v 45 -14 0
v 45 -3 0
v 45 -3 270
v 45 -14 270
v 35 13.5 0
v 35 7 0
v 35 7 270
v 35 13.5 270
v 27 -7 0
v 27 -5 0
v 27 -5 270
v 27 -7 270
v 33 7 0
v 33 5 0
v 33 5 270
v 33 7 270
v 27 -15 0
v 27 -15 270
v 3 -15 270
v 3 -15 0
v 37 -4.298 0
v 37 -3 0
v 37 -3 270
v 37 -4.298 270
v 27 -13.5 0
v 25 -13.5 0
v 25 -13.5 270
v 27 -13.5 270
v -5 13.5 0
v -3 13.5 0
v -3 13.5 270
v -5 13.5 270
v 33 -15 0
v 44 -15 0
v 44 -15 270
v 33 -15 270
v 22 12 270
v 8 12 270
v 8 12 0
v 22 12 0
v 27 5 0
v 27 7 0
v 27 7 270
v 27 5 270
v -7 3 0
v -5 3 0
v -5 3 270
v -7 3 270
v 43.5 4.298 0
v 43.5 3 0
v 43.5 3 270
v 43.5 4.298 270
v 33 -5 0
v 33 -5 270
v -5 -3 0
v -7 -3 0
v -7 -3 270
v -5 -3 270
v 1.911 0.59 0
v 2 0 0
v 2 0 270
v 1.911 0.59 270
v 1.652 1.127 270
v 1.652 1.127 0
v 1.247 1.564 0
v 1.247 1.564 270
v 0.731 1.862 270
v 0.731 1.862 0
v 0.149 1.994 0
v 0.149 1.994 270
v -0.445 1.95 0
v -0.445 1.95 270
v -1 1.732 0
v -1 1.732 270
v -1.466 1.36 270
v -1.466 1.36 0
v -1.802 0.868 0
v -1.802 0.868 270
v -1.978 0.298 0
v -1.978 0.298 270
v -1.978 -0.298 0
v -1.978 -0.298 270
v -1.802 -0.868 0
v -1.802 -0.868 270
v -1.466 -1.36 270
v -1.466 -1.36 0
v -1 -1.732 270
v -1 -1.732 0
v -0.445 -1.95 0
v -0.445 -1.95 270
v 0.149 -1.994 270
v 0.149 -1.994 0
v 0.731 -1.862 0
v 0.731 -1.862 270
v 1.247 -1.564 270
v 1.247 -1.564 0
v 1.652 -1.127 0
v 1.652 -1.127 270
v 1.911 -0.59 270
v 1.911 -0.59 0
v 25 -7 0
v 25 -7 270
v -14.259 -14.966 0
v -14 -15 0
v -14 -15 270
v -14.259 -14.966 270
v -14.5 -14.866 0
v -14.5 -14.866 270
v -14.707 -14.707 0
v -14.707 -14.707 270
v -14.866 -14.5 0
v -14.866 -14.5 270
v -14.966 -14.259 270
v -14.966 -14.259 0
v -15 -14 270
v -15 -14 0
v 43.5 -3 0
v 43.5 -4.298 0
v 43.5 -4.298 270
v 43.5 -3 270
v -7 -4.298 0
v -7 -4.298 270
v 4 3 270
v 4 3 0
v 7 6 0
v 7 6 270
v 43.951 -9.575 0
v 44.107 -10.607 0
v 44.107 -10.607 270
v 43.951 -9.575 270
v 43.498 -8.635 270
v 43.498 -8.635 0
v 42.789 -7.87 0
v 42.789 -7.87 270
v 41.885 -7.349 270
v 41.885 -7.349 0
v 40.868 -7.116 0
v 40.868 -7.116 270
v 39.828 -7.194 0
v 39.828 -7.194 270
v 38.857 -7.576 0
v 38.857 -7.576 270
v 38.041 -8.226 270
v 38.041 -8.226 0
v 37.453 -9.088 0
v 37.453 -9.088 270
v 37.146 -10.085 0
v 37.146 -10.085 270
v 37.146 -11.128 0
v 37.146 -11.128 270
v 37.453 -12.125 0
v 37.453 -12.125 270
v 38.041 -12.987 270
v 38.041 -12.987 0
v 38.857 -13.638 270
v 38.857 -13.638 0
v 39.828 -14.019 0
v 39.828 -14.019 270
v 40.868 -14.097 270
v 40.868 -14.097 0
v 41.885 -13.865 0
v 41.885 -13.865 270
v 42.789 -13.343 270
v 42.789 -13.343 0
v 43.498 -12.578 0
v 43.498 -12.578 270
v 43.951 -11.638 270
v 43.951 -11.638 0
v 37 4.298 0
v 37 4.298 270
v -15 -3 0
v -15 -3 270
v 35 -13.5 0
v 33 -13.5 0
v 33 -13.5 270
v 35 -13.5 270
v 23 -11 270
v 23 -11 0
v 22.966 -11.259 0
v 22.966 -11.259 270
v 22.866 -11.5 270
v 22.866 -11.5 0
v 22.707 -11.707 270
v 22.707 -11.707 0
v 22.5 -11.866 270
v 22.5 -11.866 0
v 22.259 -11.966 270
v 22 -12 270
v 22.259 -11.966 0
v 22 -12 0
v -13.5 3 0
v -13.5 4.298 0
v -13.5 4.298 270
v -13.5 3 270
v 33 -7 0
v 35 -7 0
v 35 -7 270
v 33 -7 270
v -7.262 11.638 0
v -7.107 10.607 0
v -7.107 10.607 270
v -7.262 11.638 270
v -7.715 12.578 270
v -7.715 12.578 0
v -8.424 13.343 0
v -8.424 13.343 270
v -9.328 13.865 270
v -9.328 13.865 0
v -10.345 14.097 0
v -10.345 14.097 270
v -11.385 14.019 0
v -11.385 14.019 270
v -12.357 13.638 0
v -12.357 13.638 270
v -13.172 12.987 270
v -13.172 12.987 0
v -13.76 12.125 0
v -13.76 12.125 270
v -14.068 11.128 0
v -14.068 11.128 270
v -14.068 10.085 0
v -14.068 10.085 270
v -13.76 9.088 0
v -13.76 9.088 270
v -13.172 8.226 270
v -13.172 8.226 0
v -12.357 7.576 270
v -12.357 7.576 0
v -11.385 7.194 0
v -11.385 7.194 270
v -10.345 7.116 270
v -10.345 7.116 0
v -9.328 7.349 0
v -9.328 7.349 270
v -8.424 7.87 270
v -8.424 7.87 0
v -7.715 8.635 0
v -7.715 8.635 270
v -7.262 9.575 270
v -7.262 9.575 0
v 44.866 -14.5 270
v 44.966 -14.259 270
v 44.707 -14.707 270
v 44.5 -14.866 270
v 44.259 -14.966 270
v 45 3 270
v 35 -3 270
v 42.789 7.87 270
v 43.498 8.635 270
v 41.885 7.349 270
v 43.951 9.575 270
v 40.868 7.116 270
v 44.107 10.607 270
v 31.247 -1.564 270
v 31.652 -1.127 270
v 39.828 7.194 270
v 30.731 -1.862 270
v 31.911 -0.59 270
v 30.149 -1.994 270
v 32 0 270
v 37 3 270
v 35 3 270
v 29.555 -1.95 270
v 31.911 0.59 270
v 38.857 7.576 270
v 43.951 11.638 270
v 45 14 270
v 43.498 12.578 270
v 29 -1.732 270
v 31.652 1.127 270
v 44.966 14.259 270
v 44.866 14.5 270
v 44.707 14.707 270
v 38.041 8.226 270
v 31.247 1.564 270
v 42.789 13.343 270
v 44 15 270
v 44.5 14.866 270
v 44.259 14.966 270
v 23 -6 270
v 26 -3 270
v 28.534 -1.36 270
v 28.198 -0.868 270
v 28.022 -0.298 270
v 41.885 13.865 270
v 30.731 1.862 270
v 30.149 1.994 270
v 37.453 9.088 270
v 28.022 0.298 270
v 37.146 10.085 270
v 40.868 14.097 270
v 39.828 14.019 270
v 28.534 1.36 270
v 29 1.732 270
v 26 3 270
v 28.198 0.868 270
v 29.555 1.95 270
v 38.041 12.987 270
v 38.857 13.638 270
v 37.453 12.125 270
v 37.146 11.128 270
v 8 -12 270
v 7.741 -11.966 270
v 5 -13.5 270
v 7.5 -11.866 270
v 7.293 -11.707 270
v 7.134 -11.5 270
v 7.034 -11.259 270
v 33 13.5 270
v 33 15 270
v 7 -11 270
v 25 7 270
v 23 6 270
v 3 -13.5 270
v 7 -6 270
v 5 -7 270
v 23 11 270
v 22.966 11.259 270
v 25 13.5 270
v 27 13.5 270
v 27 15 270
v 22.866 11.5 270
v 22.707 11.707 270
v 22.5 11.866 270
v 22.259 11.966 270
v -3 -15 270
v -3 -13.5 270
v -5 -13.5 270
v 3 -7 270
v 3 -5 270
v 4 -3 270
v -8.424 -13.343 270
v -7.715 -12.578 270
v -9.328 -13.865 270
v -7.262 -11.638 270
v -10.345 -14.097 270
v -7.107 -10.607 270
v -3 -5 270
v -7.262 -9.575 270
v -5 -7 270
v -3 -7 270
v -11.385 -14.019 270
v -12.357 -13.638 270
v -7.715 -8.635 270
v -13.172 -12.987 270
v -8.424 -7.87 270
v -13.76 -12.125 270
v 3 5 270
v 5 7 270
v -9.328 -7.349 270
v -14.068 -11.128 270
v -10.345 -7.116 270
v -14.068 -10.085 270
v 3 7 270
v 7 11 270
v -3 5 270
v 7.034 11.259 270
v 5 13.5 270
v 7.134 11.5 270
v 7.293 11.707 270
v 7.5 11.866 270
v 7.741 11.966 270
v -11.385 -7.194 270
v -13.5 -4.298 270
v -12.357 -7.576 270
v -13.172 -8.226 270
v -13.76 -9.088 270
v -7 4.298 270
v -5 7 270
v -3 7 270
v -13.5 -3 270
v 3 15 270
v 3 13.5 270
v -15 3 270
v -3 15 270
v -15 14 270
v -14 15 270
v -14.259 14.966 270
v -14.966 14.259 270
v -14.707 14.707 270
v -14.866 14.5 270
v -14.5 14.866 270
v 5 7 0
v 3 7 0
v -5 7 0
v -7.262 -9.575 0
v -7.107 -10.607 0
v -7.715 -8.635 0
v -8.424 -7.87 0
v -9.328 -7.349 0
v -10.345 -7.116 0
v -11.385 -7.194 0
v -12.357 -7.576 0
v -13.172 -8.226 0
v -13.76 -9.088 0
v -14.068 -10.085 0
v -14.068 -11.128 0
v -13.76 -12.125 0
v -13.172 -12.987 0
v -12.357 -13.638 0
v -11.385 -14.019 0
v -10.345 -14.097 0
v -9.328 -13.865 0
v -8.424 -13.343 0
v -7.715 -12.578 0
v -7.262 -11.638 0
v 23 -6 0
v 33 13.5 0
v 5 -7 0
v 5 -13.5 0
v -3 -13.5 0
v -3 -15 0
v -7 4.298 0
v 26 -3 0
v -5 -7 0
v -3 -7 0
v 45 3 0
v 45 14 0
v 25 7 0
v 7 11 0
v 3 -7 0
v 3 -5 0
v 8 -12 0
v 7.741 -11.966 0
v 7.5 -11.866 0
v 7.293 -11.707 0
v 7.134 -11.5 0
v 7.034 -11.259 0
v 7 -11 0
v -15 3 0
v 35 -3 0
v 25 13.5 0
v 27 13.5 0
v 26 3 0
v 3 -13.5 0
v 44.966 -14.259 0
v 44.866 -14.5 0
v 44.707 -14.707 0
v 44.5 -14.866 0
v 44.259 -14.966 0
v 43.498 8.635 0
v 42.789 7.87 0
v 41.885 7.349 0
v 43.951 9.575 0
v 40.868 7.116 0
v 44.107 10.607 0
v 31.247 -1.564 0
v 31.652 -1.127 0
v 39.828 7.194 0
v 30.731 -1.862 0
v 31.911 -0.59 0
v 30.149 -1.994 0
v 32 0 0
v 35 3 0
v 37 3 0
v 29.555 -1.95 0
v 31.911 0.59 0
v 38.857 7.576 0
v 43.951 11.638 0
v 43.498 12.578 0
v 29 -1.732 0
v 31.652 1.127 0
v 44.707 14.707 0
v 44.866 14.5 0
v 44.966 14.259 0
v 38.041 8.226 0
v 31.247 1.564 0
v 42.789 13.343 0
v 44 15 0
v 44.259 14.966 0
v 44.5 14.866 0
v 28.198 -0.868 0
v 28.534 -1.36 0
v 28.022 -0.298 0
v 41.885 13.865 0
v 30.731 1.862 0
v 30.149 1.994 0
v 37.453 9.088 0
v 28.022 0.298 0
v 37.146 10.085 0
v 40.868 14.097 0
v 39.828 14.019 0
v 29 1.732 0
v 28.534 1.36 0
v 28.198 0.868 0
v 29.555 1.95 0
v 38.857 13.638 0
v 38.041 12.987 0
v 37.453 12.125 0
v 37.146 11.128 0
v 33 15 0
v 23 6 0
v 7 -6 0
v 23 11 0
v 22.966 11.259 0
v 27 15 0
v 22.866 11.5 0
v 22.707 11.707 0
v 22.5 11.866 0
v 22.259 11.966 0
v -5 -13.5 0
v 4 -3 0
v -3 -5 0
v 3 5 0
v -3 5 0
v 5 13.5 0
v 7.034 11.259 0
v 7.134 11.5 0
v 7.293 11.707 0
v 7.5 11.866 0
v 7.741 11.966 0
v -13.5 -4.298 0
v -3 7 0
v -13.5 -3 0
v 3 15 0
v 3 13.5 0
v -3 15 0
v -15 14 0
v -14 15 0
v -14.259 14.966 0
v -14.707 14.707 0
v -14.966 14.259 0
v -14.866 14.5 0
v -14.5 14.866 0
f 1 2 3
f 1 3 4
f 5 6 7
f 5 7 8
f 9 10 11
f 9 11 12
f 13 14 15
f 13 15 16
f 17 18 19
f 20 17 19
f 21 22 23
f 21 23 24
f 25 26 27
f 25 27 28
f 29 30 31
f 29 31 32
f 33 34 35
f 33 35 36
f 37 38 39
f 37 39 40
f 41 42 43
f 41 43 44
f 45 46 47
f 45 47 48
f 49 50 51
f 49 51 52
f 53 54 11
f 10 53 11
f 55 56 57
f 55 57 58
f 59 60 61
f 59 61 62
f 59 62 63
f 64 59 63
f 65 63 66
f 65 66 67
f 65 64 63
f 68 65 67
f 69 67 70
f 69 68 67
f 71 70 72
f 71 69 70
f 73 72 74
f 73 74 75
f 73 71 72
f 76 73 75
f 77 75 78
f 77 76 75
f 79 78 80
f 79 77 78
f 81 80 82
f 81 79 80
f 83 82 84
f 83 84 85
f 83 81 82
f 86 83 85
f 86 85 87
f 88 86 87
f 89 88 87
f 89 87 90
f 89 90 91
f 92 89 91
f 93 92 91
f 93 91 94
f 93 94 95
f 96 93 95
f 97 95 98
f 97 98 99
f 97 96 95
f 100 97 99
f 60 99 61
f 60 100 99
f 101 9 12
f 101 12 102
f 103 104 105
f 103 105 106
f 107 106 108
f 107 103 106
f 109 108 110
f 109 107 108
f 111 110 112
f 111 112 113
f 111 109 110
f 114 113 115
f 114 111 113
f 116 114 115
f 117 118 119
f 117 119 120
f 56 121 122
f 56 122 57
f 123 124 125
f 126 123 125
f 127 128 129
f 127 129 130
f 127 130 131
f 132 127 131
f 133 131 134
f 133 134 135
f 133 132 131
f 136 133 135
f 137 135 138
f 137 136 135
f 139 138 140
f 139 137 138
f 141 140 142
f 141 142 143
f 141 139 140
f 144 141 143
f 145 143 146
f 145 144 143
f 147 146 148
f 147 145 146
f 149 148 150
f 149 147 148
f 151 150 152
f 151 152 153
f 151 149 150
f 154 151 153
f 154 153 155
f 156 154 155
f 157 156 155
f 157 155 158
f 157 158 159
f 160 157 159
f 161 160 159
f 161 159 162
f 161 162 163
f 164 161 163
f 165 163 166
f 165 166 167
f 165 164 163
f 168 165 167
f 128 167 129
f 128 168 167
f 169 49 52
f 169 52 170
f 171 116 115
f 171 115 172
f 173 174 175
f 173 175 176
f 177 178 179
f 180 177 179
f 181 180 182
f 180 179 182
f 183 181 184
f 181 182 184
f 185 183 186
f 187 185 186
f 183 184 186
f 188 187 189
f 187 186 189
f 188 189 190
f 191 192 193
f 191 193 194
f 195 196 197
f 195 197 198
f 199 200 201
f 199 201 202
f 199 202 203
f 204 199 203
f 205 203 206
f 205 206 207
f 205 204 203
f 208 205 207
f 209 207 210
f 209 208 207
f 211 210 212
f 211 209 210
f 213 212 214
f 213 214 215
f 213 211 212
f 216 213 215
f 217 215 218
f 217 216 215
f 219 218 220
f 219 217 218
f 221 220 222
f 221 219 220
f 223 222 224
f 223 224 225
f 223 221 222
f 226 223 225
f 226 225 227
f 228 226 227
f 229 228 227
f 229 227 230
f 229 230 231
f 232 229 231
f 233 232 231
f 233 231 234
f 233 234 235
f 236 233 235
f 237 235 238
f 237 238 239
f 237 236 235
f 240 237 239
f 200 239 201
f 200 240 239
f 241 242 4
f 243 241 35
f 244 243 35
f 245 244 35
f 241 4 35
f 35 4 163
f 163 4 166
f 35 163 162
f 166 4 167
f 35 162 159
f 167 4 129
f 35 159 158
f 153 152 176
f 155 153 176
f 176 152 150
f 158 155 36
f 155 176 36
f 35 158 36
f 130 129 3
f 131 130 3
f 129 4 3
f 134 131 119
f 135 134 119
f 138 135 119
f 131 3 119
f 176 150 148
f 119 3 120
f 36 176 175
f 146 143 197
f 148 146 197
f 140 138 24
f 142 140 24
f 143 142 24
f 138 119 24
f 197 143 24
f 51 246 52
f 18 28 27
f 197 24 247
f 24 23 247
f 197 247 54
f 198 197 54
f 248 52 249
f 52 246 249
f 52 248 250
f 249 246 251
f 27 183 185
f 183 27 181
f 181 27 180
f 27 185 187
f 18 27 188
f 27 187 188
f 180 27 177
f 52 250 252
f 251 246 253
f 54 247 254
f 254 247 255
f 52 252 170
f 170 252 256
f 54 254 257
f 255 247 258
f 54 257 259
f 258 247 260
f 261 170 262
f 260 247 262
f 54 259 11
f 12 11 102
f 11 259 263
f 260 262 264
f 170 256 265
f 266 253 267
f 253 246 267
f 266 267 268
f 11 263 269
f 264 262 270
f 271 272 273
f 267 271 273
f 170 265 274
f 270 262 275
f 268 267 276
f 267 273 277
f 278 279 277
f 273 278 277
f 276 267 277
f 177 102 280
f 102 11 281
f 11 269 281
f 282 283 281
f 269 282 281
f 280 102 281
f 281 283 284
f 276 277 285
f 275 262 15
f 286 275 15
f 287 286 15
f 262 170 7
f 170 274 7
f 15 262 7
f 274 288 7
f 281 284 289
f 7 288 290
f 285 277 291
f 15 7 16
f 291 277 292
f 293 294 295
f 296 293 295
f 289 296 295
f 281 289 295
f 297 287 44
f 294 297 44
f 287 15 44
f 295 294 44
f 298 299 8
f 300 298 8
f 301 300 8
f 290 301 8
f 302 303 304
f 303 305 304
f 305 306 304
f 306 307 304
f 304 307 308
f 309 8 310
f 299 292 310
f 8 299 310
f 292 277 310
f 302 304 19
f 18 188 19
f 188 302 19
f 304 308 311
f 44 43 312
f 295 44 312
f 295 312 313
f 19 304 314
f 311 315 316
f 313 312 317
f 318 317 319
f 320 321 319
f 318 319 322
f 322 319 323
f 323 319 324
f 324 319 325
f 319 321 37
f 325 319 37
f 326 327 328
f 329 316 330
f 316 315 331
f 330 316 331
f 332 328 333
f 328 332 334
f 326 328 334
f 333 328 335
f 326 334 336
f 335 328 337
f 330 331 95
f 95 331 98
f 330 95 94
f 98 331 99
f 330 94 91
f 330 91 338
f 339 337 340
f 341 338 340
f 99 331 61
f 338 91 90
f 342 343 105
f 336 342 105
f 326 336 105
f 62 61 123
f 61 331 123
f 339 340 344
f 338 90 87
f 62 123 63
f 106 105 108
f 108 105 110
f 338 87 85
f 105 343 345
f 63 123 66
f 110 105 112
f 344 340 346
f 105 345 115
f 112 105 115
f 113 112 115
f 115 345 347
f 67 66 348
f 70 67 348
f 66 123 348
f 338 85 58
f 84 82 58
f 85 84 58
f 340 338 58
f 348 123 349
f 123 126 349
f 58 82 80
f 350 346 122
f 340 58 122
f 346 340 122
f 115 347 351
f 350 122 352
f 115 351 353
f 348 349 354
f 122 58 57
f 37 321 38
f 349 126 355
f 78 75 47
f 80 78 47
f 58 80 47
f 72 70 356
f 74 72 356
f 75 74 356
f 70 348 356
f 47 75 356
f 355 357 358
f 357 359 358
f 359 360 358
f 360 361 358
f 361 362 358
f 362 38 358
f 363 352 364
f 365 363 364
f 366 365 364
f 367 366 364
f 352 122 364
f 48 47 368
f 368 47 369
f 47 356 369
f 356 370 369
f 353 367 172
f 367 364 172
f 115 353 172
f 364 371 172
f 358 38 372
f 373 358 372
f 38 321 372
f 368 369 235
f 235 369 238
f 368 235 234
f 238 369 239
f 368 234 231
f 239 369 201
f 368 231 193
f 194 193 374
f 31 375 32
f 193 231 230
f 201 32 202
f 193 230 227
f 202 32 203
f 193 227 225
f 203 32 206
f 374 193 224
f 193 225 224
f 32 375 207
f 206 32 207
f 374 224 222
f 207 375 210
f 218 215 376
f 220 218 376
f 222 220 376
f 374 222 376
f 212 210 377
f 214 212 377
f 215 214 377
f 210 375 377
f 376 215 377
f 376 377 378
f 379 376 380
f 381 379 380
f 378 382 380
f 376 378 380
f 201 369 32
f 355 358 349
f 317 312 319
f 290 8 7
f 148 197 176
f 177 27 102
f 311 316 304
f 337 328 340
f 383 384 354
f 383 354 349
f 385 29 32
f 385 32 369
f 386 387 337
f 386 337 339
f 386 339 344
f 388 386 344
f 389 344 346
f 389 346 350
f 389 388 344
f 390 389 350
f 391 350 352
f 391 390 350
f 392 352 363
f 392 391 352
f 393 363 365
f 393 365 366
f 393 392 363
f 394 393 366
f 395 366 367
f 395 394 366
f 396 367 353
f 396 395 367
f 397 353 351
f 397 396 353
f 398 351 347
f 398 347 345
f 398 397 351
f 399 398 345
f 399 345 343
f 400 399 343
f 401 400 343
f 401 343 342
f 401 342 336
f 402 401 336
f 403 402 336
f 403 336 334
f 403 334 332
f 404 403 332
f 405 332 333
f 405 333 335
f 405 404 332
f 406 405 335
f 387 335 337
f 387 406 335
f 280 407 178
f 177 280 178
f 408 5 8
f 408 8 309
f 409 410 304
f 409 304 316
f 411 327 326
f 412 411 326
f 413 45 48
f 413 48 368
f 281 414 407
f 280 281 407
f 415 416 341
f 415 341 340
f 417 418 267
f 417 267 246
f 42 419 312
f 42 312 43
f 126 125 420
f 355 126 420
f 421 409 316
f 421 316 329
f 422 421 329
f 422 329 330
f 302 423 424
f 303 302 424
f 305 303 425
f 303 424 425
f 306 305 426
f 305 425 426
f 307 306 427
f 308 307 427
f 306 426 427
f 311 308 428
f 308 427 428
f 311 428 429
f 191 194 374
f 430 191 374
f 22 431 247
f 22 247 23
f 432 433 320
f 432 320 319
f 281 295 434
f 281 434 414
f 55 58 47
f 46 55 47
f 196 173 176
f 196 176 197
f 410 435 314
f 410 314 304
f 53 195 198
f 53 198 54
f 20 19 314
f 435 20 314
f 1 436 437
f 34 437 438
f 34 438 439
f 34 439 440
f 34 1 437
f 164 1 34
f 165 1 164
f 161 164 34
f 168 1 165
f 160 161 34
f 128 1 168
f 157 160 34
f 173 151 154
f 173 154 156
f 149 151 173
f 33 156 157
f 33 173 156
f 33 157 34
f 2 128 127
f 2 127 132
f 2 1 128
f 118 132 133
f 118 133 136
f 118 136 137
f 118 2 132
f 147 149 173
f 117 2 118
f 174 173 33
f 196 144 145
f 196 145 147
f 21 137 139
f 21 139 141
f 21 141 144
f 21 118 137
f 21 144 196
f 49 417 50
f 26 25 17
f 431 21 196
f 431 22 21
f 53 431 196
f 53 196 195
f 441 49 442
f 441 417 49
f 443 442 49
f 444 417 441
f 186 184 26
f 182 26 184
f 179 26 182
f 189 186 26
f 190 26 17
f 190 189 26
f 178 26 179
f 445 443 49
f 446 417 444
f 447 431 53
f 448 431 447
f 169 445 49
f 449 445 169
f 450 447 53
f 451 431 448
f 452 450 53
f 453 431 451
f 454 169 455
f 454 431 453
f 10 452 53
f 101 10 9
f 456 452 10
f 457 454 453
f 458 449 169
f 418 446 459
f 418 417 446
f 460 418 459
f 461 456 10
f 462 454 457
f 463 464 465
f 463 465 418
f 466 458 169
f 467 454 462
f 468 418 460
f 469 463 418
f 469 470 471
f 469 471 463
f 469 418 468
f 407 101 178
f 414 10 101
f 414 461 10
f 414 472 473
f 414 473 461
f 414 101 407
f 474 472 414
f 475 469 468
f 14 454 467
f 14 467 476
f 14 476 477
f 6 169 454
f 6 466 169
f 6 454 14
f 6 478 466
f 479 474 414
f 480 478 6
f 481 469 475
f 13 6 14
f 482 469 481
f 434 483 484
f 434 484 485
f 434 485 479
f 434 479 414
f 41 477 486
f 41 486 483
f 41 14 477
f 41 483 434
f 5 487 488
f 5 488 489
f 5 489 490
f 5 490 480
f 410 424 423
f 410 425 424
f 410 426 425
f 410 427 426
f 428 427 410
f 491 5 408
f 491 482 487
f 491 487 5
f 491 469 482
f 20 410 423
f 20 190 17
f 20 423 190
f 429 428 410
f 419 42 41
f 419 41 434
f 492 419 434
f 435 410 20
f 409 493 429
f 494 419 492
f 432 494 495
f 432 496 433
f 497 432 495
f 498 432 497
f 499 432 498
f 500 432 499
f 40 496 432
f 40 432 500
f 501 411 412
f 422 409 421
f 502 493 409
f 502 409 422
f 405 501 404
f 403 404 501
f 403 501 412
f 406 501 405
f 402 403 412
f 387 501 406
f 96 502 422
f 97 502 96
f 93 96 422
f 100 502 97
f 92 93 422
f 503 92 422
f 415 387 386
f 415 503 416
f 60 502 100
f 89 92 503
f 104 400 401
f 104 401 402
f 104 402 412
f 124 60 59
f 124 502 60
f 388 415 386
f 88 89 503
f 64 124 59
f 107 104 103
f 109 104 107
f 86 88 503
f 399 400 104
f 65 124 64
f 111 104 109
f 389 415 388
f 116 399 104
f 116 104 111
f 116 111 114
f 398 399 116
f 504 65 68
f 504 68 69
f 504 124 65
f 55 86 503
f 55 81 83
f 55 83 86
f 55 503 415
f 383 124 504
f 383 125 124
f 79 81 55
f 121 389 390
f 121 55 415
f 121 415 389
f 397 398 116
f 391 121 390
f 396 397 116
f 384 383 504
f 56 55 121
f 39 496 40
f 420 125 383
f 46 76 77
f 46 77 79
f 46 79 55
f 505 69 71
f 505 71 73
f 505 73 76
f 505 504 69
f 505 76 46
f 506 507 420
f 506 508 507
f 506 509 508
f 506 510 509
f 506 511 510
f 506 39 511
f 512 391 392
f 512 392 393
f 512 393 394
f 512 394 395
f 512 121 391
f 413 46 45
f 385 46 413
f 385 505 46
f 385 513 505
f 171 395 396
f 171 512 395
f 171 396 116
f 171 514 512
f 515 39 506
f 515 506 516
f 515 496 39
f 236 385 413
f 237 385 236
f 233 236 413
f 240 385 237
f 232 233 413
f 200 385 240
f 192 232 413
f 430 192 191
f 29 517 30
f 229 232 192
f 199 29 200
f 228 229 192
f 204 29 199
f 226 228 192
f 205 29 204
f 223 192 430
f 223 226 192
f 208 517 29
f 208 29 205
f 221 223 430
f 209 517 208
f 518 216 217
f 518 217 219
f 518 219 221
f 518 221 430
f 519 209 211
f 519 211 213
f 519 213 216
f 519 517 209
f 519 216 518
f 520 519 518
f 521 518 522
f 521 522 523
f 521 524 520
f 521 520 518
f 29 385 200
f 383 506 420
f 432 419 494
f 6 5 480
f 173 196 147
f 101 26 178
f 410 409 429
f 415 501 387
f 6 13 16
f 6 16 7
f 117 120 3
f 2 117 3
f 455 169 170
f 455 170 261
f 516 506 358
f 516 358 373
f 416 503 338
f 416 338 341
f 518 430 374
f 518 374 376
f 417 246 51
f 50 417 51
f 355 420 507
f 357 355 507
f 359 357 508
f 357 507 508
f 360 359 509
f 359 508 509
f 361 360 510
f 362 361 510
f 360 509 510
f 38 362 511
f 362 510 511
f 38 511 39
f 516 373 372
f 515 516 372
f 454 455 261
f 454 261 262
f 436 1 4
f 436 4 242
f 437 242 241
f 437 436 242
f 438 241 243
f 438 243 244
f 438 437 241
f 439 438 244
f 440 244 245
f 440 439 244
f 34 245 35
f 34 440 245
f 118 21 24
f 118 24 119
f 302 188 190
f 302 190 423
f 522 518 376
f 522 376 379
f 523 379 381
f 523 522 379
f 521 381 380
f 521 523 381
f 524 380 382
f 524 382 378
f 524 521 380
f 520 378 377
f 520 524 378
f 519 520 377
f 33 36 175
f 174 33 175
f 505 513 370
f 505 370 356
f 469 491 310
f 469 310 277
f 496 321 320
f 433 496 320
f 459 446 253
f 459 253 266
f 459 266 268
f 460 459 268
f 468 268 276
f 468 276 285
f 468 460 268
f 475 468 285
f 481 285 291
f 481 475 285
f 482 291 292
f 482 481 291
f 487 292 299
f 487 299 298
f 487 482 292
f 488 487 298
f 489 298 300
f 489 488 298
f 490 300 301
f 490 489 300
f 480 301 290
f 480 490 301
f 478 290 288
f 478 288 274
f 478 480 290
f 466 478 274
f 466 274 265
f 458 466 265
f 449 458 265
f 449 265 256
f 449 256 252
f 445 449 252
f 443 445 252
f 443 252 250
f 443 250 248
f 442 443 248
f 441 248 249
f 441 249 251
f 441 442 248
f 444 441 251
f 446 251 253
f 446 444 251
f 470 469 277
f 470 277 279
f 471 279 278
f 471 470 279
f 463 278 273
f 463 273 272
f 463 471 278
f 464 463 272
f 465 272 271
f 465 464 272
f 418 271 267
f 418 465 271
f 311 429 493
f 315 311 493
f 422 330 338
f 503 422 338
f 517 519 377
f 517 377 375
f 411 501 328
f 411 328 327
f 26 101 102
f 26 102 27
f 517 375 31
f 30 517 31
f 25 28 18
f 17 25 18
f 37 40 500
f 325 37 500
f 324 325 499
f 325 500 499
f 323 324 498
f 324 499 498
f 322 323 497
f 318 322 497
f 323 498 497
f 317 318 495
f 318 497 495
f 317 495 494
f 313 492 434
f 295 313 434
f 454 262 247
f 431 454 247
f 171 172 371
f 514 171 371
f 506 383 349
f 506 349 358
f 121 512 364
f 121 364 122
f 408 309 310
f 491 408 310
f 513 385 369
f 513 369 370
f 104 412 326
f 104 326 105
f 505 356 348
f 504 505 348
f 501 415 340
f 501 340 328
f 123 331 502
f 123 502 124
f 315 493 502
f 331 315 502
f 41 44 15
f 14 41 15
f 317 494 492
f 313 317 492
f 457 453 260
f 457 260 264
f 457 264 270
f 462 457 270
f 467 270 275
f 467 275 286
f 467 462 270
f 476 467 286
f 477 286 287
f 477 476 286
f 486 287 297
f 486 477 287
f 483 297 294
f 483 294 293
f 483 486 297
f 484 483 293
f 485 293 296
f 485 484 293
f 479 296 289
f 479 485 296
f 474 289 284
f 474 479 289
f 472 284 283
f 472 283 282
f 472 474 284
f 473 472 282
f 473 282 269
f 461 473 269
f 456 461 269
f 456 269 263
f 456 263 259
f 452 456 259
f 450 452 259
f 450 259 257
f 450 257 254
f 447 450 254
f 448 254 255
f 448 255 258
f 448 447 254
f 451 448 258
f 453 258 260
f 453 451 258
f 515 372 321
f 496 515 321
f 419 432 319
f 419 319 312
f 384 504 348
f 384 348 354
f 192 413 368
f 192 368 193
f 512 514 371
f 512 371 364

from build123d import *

# Parameters (mm, degrees)
SKETCH1_R           = 2
SKETCH1_R_2         = 3.5
BOSS_EXTRUDE1_DEPTH = 270


with BuildPart() as part:
    # Sketch1 → Boss-Extrude1 (new body)
    with BuildSketch(Plane.XY):
        with BuildLine():
            Line((-5, -3), (-5, 3))
            Line((-5, 3), (-7, 3))
            Line((-7, 3), (-7, 4.298364791))
            Line((-7, 4.298364791), (-13.5, 4.298364791))
            Line((-13.5, 4.298364791), (-13.5, 3))
            Line((-13.5, 3), (-15, 3))
            Line((-15, 3), (-15, 14))
            ThreePointArc((-15, 14), (-14.707106781, 14.707106781), (-14, 15))
            Line((-14, 15), (-3, 15))
            Line((-3, 15), (-3, 13.5))
            Line((-3, 13.5), (-5, 13.5))
            Line((-5, 13.5), (-5, 7))
            Line((-5, 7), (-3, 7))
            Line((-3, 7), (-3, 5))
            Line((-3, 5), (3, 5))
            Line((3, 5), (3, 7))
            Line((3, 7), (5, 7))
            Line((5, 7), (5, 13.5))
            Line((5, 13.5), (3, 13.5))
            Line((3, 13.5), (3, 15))
            Line((3, 15), (27, 15))
            Line((27, 15), (27, 13.5))
            Line((27, 13.5), (25, 13.5))
            Line((25, 13.5), (25, 7))
            Line((25, 7), (27, 7))
            Line((27, 7), (27, 5))
            Line((27, 5), (33, 5))
            Line((33, 5), (33, 7))
            Line((33, 7), (35, 7))
            Line((35, 7), (35, 13.5))
            Line((35, 13.5), (33, 13.5))
            Line((33, 13.5), (33, 15))
            Line((33, 15), (44, 15))
            ThreePointArc((44, 15), (44.707106781, 14.707106781), (45, 14))
            Line((45, 14), (45, 3))
            Line((45, 3), (43.5, 3))
            Line((43.5, 3), (43.5, 4.298364791))
            Line((43.5, 4.298364791), (37, 4.298364791))
            Line((37, 4.298364791), (37, 3))
            Line((37, 3), (35, 3))
            Line((35, 3), (35, -3))
            Line((35, -3), (37, -3))
            Line((37, -3), (37, -4.298364791))
            Line((37, -4.298364791), (43.5, -4.298364791))
            Line((43.5, -4.298364791), (43.5, -3))
            Line((43.5, -3), (45, -3))
            Line((45, -3), (45, -14))
            ThreePointArc((45, -14), (44.707106781, -14.707106781), (44, -15))
            Line((44, -15), (33, -15))
            Line((33, -15), (33, -13.5))
            Line((33, -13.5), (35, -13.5))
            Line((35, -13.5), (35, -7))
            Line((35, -7), (33, -7))
            Line((33, -7), (33, -5))
            Line((33, -5), (27, -5))
            Line((27, -5), (27, -7))
            Line((27, -7), (25, -7))
            Line((25, -7), (25, -13.5))
            Line((25, -13.5), (27, -13.5))
            Line((27, -13.5), (27, -15))
            Line((27, -15), (3, -15))
            Line((3, -15), (3, -13.5))
            Line((3, -13.5), (5, -13.5))
            Line((5, -13.5), (5, -7))
            Line((5, -7), (3, -7))
            Line((3, -7), (3, -5))
            Line((3, -5), (-3, -5))
            Line((-3, -5), (-3, -7))
            Line((-3, -7), (-5, -7))
            Line((-5, -7), (-5, -13.5))
            Line((-5, -13.5), (-3, -13.5))
            Line((-3, -13.5), (-3, -15))
            Line((-3, -15), (-14, -15))
            ThreePointArc((-14, -15), (-14.707106781, -14.707106781), (-15, -14))
            Line((-15, -14), (-15, -3))
            Line((-15, -3), (-13.5, -3))
            Line((-13.5, -3), (-13.5, -4.298364791))
            Line((-13.5, -4.298364791), (-7, -4.298364791))
            Line((-7, -4.298364791), (-7, -3))
            Line((-7, -3), (-5, -3))
        make_face()
        Circle(SKETCH1_R, mode=Mode.SUBTRACT)
        with Locations((-10.606601718, 10.606601718)):
            Circle(SKETCH1_R_2, mode=Mode.SUBTRACT)
        with Locations((40.606601718, 10.606601718)):
            Circle(SKETCH1_R_2, mode=Mode.SUBTRACT)
        with Locations((30, 0)):
            Circle(SKETCH1_R, mode=Mode.SUBTRACT)
        with Locations((40.606601718, -10.606601718)):
            Circle(SKETCH1_R_2, mode=Mode.SUBTRACT)
        with Locations((-10.606601718, -10.606601718)):
            Circle(SKETCH1_R_2, mode=Mode.SUBTRACT)
        with BuildLine():
            Line((4, -3), (4, 3))
            Line((4, 3), (7, 6))
            Line((7, 6), (7, 11))
            ThreePointArc((7, 11), (7.292893219, 11.707106781), (8, 12))
            Line((8, 12), (22, 12))
            ThreePointArc((22, 12), (22.707106781, 11.707106781), (23, 11))
            Line((23, 11), (23, 6))
            Line((23, 6), (26, 3))
            Line((26, 3), (26, -3))
            Line((26, -3), (23, -6))
            Line((23, -6), (23, -11))
            ThreePointArc((23, -11), (22.707106781, -11.707106781), (22, -12))
            Line((22, -12), (8, -12))
            ThreePointArc((8, -12), (7.292893219, -11.707106781), (7, -11))
            Line((7, -11), (7, -6))
            Line((7, -6), (4, -3))
        make_face(mode=Mode.SUBTRACT)
    extrude(amount=BOSS_EXTRUDE1_DEPTH)


solid = part.part
